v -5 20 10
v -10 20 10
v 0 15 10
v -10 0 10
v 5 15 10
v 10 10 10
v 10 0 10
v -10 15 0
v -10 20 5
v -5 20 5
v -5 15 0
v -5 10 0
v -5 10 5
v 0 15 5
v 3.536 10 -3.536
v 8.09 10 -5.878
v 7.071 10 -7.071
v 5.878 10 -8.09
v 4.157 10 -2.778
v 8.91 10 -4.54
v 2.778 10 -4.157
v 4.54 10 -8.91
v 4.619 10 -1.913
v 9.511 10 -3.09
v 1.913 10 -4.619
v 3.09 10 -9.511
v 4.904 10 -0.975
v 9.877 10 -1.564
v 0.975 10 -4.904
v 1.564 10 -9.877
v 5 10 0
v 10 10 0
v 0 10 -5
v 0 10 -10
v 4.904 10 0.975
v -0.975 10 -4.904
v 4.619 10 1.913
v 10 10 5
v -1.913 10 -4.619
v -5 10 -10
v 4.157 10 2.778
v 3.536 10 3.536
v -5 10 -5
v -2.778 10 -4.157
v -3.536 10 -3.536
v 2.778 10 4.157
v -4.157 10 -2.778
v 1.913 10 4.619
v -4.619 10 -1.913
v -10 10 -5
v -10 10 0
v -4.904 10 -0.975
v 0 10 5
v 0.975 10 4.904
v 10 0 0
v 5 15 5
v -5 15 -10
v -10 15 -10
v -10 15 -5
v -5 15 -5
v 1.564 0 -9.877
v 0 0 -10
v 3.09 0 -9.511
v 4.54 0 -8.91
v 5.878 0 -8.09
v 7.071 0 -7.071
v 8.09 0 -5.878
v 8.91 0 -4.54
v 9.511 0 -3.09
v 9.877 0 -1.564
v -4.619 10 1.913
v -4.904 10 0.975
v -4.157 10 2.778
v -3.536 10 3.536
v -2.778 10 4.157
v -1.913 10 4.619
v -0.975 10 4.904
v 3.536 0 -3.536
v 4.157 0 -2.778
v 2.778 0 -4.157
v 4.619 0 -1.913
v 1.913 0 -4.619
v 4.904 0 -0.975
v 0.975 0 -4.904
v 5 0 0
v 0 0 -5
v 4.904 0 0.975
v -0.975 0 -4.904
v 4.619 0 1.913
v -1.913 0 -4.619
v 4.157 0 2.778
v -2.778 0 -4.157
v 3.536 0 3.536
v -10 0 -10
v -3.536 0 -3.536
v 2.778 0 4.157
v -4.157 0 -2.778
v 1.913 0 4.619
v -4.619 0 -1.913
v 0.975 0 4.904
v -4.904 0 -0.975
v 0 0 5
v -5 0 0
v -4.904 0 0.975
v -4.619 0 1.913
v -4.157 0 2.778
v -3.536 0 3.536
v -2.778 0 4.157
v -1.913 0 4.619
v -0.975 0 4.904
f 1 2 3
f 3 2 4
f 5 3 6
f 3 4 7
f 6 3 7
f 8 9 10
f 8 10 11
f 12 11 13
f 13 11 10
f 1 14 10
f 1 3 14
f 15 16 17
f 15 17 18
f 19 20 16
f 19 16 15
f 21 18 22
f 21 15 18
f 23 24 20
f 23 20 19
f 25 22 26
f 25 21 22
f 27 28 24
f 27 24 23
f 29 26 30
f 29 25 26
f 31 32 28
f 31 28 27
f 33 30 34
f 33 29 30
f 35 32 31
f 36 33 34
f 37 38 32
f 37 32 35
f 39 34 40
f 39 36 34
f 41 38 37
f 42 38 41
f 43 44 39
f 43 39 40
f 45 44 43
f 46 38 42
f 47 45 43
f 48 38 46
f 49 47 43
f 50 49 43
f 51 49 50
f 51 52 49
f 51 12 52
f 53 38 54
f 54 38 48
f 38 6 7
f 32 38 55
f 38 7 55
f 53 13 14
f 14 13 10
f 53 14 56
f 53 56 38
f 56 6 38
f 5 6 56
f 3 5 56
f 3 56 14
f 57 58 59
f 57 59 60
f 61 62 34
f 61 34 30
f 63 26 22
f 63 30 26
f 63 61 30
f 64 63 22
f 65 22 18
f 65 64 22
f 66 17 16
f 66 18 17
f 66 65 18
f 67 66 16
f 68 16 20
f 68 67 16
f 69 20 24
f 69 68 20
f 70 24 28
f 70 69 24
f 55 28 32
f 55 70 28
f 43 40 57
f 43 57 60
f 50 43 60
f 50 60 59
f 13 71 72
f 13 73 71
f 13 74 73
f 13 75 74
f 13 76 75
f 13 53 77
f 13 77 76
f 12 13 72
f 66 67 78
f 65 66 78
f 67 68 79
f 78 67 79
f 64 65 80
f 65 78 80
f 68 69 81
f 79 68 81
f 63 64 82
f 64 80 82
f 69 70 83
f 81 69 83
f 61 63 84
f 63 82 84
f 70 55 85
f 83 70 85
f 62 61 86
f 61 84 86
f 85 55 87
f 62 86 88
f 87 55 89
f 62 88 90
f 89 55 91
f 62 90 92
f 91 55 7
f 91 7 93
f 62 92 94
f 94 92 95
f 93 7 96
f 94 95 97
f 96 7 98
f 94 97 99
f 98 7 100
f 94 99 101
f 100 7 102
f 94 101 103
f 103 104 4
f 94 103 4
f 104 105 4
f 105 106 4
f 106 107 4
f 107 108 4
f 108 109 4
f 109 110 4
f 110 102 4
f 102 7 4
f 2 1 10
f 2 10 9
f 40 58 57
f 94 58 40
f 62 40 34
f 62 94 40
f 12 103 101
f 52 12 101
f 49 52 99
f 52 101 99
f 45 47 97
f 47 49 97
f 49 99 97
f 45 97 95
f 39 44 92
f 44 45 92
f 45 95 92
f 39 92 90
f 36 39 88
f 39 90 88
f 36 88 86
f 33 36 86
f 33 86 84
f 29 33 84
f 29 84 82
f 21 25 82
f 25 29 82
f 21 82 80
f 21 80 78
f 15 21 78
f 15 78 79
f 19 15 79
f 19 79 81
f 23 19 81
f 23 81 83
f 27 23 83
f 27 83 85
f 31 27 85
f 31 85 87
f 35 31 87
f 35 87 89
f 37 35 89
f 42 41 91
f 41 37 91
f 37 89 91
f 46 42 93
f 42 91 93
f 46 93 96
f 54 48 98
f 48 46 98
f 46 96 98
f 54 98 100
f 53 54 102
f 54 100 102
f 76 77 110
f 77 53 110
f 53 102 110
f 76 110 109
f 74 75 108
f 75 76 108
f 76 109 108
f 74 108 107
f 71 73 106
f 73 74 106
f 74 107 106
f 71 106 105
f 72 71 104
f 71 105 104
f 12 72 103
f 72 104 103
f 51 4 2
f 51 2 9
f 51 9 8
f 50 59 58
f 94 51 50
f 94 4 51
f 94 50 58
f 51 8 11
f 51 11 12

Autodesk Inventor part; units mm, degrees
ref_plane "YZ Plane" through (0, 0, 0) normal (1, 0, 0) x (0, 1, 0)
ref_plane "XZ Plane" through (0, 0, 0) normal (0, 1, 0) x (-1, 0, 0)
ref_plane "XY Plane" through (0, 0, 0) normal (0, 0, 1) x (1, 0, 0)
sketch "草圖2" plane through (0, 0, 0) normal (0, 1, 0) x (-1, 0, 0)
  line L0 (10, 10) -> (-10, 10)
  line L1 (-10, 10) -> (-10, 0)
  line L2 (-10, -10) -> (0, -10) construction
  line L3 (10, -10) -> (10, 10)
  arc A0 (-10, 0) -> (0, -10) centre (0, 0) ccw
  line L4 (-10, 0) -> (-10, -10) construction
  line L5 (0, -10) -> (10, -10)
  circle A1 centre (0, 0) radius 5
  point P0 (0, 0)
  point P1 (10, 0)
  dimension "d2" = 20
  dimension "d3" = 20
  dimension "d4" = 10
  dimension "d5" = 10
  dimension "d6" = 10
extrude "擠出1" add sketch "草圖2" along normal blind 10
sketch "草圖3" plane through (-10, 0, 10) normal (0, 0, 1) x (1, 0, 0)
  line L0 (0, 10) -> (20, 10) projected
  line L1 (20, 10) -> (15, 15)
  line L2 (15, 15) -> (10, 15)
  line L3 (10, 15) -> (5, 20)
  line L4 (5, 20) -> (0, 20)
  line L5 (0, 20) -> (0, 10)
  point P0 (10, 0)
  dimension "d9" = 5
  dimension "d10" = 5
  dimension "d11" = 5
  dimension "d12" = 5
  dimension "d13" = 10
extrude "擠出2" add sketch "草圖3" against normal blind 5
sketch "草圖4" plane through (-10, 0, -10) normal (-1, 0, 0) x (0, 0, 1)
  line L0 (15, 10) -> (15, 20) projected
  line L1 (15, 20) -> (10, 15)
  line L2 (10, 15) -> (10, 10)
  line L3 (10, 0) -> (10, 10) projected
  line L4 (15, 10) -> (10, 10)
  dimension "d16" = 5
  dimension "d17" = 5
extrude "擠出3" add sketch "草圖4" against normal blind 5
sketch "草圖5" plane through (0, 10, 0) normal (0, 1, 0) x (1, 0, 0)
  line L0 (-10, 10) -> (-5, 10)
  line L1 (-5, 10) -> (-5, 5)
  line L2 (-5, 5) -> (-10, 5)
  line L3 (-10, 5) -> (-10, 10)
  line L4 (-5, 0) -> (-5, -5) projected
  point P0 (0, 0)
  dimension "d20" = 5
  dimension "d21" = 5
extrude "擠出4" add sketch "草圖5" along normal blind 5
properties part number "20"
